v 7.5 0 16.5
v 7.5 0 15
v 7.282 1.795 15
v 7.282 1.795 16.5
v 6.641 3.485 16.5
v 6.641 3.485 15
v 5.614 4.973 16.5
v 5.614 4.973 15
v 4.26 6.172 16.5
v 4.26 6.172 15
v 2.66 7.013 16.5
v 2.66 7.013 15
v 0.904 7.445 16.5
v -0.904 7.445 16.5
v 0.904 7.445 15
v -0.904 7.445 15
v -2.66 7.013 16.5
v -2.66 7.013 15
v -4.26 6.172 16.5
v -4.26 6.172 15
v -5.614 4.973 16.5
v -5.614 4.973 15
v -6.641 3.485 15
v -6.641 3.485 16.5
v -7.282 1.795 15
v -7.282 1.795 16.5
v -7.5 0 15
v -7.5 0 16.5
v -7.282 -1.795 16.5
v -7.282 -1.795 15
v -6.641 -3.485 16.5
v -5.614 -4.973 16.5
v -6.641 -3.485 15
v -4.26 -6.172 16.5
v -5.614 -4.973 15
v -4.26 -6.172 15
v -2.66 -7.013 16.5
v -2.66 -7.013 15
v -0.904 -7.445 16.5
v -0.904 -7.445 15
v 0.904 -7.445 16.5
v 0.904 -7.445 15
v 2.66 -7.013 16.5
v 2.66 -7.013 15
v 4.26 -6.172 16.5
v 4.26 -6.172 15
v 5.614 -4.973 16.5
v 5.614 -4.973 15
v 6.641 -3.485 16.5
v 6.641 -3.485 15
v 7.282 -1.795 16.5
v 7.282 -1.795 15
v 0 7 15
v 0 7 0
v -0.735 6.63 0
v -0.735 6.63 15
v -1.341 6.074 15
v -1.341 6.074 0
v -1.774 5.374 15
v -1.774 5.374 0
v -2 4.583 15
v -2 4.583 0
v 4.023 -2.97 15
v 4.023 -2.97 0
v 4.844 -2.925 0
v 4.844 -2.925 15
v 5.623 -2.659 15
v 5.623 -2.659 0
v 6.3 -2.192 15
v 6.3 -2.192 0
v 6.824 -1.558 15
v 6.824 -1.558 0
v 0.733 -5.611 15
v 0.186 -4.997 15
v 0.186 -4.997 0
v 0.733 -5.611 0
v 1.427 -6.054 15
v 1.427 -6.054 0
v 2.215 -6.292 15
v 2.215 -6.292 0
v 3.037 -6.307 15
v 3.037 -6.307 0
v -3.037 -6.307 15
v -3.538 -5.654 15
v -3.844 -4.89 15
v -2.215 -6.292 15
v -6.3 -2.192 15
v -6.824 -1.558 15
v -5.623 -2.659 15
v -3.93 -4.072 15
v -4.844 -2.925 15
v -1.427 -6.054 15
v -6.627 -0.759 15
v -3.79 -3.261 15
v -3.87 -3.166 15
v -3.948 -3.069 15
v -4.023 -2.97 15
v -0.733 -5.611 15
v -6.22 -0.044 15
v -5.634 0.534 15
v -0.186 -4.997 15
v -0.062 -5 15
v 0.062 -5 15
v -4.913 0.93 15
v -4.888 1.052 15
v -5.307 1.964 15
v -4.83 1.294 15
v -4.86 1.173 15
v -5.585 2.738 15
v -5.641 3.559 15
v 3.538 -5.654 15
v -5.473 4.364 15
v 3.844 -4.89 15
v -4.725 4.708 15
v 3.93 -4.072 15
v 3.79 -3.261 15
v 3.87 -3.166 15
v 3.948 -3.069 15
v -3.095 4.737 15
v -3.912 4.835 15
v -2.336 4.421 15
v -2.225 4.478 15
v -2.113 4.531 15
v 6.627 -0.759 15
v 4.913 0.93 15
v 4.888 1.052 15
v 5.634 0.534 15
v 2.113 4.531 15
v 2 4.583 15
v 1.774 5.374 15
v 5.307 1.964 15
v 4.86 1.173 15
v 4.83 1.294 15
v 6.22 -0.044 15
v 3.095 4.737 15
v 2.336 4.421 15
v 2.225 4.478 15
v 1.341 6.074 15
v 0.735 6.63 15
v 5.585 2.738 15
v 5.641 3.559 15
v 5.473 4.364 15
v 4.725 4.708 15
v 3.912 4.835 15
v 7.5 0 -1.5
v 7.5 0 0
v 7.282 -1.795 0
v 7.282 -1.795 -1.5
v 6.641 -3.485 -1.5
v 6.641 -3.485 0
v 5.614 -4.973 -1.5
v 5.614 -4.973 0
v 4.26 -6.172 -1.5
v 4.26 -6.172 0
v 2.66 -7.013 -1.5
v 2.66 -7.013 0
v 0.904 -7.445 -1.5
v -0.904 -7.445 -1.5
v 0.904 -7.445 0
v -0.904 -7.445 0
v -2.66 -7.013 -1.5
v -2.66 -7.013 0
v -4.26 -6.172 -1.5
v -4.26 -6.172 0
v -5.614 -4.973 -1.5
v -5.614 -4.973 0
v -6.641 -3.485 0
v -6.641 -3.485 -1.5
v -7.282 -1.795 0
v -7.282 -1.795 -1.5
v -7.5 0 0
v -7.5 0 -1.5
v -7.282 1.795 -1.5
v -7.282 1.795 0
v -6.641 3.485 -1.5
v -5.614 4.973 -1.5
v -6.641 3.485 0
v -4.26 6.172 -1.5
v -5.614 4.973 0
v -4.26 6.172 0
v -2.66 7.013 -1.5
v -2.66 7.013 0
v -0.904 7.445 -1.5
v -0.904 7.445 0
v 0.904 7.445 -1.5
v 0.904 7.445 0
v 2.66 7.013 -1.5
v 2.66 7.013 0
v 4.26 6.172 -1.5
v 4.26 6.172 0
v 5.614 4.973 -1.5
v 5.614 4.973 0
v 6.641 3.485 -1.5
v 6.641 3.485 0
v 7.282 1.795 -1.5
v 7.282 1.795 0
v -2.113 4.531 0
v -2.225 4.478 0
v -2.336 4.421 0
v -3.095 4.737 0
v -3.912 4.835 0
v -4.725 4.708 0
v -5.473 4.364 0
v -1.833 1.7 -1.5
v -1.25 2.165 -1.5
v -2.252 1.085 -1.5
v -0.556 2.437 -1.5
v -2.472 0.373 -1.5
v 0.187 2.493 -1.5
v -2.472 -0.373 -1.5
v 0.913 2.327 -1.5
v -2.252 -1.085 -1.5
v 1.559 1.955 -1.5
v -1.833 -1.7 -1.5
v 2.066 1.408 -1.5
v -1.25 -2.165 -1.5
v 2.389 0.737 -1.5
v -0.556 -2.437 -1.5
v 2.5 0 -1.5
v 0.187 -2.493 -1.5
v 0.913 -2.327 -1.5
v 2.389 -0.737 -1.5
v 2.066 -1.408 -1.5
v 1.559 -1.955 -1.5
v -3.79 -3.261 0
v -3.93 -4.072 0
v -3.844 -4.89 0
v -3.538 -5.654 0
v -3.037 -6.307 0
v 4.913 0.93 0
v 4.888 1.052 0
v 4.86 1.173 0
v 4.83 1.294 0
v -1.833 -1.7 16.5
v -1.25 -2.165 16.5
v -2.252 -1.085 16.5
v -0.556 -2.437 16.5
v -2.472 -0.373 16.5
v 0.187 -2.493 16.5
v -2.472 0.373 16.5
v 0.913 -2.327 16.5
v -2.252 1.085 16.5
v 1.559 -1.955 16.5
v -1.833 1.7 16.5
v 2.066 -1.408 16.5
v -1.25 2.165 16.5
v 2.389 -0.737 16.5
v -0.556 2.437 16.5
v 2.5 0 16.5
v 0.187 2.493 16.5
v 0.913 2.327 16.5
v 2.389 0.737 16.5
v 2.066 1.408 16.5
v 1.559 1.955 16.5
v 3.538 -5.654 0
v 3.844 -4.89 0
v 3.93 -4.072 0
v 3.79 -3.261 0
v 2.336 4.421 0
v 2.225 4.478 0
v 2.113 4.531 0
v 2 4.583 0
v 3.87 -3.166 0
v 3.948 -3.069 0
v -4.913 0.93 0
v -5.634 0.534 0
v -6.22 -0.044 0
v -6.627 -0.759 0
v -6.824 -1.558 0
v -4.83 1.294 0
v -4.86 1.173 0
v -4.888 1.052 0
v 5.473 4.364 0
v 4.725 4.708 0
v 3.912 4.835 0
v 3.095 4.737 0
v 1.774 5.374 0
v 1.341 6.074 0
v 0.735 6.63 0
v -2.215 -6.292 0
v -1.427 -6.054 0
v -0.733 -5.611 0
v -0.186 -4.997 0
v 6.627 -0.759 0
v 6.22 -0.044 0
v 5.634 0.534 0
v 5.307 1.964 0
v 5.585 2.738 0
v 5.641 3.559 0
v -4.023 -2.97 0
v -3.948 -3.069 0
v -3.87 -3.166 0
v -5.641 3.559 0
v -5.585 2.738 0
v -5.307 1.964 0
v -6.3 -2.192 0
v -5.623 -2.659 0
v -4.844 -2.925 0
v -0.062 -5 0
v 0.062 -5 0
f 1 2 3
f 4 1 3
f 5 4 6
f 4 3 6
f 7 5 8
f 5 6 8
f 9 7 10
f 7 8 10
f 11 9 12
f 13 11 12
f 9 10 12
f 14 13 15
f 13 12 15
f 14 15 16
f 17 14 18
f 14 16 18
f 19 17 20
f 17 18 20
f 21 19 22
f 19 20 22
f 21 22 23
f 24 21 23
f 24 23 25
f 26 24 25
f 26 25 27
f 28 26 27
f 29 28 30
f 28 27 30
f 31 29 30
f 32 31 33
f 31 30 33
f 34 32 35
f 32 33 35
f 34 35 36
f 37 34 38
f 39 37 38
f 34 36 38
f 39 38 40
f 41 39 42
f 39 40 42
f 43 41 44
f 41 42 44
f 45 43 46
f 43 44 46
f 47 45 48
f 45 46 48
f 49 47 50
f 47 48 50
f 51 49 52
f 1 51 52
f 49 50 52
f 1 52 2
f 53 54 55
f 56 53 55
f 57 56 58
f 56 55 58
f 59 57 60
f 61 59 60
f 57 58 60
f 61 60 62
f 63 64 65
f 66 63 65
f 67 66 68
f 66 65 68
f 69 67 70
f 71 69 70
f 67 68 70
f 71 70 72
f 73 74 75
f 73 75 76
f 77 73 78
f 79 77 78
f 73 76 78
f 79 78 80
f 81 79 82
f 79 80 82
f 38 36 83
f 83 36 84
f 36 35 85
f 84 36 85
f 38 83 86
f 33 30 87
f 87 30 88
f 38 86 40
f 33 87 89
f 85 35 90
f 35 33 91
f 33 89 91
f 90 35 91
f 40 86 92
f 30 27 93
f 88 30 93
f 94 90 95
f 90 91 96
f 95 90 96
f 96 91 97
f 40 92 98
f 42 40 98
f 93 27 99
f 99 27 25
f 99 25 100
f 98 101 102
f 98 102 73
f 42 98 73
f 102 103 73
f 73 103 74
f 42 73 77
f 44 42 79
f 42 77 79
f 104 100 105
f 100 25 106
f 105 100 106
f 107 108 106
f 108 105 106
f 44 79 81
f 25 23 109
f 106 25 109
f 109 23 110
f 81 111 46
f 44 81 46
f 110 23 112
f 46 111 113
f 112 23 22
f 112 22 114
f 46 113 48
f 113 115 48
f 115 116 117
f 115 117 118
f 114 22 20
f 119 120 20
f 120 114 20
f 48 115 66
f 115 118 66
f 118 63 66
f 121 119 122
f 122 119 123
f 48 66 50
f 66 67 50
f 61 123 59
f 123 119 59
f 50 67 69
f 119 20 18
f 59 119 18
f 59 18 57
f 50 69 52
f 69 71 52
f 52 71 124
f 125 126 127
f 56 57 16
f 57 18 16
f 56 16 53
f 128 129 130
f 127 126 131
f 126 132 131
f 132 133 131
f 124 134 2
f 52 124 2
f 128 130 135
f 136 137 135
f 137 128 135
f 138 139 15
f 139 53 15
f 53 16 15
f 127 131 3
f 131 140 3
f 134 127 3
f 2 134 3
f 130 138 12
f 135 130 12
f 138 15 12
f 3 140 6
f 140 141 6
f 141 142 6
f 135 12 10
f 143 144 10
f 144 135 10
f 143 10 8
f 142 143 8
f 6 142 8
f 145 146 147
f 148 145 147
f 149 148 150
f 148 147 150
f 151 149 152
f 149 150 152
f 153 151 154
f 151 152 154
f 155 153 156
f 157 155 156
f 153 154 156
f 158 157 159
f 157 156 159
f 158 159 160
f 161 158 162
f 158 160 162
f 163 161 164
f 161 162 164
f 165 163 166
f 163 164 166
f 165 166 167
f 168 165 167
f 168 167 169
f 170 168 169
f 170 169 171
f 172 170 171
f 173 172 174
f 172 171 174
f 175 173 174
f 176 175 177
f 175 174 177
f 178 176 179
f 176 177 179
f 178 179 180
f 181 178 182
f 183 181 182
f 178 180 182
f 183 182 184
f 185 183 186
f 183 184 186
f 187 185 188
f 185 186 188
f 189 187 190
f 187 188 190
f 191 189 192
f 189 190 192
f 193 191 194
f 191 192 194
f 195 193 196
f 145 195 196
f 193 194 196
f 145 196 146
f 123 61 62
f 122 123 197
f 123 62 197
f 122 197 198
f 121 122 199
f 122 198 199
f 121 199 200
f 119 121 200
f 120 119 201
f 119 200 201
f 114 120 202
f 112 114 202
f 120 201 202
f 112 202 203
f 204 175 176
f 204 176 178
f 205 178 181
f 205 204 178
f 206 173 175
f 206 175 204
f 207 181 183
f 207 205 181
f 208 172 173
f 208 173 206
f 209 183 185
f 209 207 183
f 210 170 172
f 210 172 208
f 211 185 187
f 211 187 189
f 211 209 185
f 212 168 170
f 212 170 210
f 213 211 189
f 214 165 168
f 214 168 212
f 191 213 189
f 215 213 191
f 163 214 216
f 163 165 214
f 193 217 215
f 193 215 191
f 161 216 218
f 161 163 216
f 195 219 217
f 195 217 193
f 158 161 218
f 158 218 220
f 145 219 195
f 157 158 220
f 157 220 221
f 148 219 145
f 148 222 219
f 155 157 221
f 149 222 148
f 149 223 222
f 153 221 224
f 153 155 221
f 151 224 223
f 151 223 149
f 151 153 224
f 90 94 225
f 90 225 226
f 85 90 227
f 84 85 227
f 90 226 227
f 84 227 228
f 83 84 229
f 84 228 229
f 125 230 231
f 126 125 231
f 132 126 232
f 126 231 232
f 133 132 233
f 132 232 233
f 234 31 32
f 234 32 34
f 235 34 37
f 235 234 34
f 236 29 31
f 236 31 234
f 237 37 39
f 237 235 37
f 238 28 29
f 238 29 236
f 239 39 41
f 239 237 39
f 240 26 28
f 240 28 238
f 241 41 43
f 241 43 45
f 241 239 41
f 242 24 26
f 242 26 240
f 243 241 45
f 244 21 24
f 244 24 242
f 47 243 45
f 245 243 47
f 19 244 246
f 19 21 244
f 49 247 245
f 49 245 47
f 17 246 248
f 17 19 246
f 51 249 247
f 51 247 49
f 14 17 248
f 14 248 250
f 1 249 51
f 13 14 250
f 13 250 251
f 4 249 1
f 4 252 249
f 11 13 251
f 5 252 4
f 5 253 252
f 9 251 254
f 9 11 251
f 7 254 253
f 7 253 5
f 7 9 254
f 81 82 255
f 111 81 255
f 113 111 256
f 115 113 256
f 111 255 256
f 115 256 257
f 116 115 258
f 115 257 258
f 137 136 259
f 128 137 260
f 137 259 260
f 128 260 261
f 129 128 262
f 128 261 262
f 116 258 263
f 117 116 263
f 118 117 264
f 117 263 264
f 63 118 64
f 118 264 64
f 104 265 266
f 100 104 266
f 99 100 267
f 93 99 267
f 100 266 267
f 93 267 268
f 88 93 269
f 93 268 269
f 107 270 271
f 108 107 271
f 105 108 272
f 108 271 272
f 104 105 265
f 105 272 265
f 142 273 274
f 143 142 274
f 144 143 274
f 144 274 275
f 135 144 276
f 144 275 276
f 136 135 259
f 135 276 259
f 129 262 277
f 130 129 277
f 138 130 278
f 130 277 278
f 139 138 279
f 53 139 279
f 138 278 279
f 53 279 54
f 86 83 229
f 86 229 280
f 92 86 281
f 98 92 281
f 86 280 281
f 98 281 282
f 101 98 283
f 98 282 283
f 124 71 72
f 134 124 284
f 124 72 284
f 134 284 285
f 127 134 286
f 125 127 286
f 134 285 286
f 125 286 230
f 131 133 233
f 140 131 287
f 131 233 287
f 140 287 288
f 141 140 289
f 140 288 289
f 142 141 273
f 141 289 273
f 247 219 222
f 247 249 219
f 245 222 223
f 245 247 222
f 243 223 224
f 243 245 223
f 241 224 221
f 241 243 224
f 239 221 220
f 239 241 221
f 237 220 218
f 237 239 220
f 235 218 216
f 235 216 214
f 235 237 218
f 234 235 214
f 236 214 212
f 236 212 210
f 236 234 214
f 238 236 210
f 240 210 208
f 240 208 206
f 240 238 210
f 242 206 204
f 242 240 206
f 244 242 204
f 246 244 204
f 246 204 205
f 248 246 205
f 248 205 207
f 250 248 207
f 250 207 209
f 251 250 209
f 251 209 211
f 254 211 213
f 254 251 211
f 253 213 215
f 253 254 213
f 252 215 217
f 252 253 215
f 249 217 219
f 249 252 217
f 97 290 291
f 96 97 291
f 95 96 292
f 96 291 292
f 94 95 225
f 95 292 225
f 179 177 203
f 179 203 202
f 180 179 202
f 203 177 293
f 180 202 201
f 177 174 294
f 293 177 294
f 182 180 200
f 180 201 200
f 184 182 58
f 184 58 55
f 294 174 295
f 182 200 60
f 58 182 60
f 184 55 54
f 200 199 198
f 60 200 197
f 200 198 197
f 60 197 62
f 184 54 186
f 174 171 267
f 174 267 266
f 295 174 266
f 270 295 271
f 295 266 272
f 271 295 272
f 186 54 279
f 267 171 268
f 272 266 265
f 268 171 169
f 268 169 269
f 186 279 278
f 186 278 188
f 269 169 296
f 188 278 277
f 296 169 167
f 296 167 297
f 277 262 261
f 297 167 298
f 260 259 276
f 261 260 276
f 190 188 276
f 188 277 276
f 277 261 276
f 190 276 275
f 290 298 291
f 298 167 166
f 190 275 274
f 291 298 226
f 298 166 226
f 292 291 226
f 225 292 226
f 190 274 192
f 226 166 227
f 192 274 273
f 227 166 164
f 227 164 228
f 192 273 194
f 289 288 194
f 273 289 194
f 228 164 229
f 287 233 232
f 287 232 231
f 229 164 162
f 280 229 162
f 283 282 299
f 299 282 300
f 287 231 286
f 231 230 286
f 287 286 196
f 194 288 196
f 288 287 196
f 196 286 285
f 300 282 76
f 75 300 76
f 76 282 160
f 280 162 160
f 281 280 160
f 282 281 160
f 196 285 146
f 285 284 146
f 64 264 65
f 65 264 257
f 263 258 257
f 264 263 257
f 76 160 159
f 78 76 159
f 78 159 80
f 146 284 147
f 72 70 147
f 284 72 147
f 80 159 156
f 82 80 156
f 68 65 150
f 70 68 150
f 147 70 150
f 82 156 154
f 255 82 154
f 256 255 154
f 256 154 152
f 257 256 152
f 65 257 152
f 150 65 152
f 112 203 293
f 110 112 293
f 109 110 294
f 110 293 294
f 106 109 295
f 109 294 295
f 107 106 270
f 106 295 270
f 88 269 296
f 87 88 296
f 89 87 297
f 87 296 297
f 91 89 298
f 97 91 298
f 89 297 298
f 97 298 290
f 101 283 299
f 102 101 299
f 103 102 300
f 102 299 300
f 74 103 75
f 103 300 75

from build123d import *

# Parameters (mm, degrees)
F0_R     = 2.5
F1_DEPTH = 15
F2_R     = 7.5
F2_R_2   = 2.5
F3_DEPTH = 1.5
F4_R     = 7.5
F4_R_2   = 2.5
F5_DEPTH = 1.5


with BuildPart() as f1:
    # F0 (on Top) → F1 (new body)
    with BuildSketch(Plane.XY):
        with BuildLine():
            ThreePointArc((0, 7), (-1.3412127701, 6.0735823287), (-2, 4.582575695))
            ThreePointArc((-2, 4.582575695), (-2.1694186956, 4.5048443395), (-2.3358223454, 4.420852177))
            ThreePointArc((-2.3358223454, 4.420852177), (-3.9122853917, 4.8354190111), (-5.4728203773, 4.364428613))
            ThreePointArc((-5.4728203773, 4.364428613), (-5.5847503602, 2.7382142744), (-4.8297815528, 1.2935262471))
            ThreePointArc((-4.8297815528, 1.2935262471), (-4.8746395609, 1.1126046698), (-4.9127228226, 0.9301368008))
            ThreePointArc((-4.9127228226, 0.9301368008), (-6.2197528574, -0.0439134465), (-6.8244953853, -1.5576465377))
            ThreePointArc((-6.8244953853, -1.5576465377), (-5.622857021, -2.659084978), (-4.0226390868, -2.9695748479))
            ThreePointArc((-4.0226390868, -2.9695748479), (-3.9091574123, -3.1174490093), (-3.7902428131, -3.2609905577))
            ThreePointArc((-3.7902428131, -3.2609905577), (-3.8436195617, -4.8901781832), (-3.0371861738, -6.3067820753))
            ThreePointArc((-3.0371861738, -6.3067820753), (-1.4268376596, -6.0540390065), (-0.1863673415, -4.9965255142))
            ThreePointArc((-0.1863673415, -4.9965255142), (0, -5), (0.1863673415, -4.9965255142))
            ThreePointArc((0.1863673415, -4.9965255142), (1.4268376596, -6.0540390065), (3.0371861738, -6.3067820753))
            ThreePointArc((3.0371861738, -6.3067820753), (3.8436195617, -4.8901781832), (3.7902428131, -3.2609905577))
            ThreePointArc((3.7902428131, -3.2609905577), (3.9091574123, -3.1174490093), (4.0226390868, -2.9695748479))
            ThreePointArc((4.0226390868, -2.9695748479), (5.622857021, -2.659084978), (6.8244953853, -1.5576465377))
            ThreePointArc((6.8244953853, -1.5576465377), (6.2197528574, -0.0439134465), (4.9127228226, 0.9301368008))
            ThreePointArc((4.9127228226, 0.9301368008), (4.8746395609, 1.1126046698), (4.8297815528, 1.2935262471))
            ThreePointArc((4.8297815528, 1.2935262471), (5.5847503602, 2.7382142744), (5.4728203773, 4.364428613))
            ThreePointArc((5.4728203773, 4.364428613), (3.9122853917, 4.8354190111), (2.3358223454, 4.420852177))
            ThreePointArc((2.3358223454, 4.420852177), (2.1694186956, 4.5048443395), (2, 4.582575695))
            ThreePointArc((2, 4.582575695), (1.3412127701, 6.0735823287), (0, 7))
        make_face()
        Circle(F0_R, mode=Mode.SUBTRACT)
    extrude(amount=F1_DEPTH)

    # F2 (on face) → F3 (join)
    with BuildSketch(Plane.XY.offset(15)):
        Circle(F2_R)
        with BuildLine():
            ThreePointArc((4.8297815528, 1.2935262471), (4.8746395609, 1.1126046698), (4.9127228226, 0.9301368008))
            ThreePointArc((4.9127228226, 0.9301368008), (6.2197528574, -0.0439134465), (6.8244953853, -1.5576465377))
            ThreePointArc((6.8244953853, -1.5576465377), (5.622857021, -2.659084978), (4.0226390868, -2.9695748479))
            ThreePointArc((4.0226390868, -2.9695748479), (3.9091574123, -3.1174490093), (3.7902428131, -3.2609905577))
            ThreePointArc((3.7902428131, -3.2609905577), (3.8436195617, -4.8901781832), (3.0371861738, -6.3067820753))
            ThreePointArc((3.0371861738, -6.3067820753), (1.4268376596, -6.0540390065), (0.1863673415, -4.9965255142))
            ThreePointArc((0.1863673415, -4.9965255142), (0, -5), (-0.1863673415, -4.9965255142))
            ThreePointArc((-0.1863673415, -4.9965255142), (-1.4268376596, -6.0540390065), (-3.0371861738, -6.3067820753))
            ThreePointArc((-3.0371861738, -6.3067820753), (-3.8436195617, -4.8901781832), (-3.7902428131, -3.2609905577))
            ThreePointArc((-3.7902428131, -3.2609905577), (-3.9091574123, -3.1174490093), (-4.0226390868, -2.9695748479))
            ThreePointArc((-4.0226390868, -2.9695748479), (-5.622857021, -2.659084978), (-6.8244953853, -1.5576465377))
            ThreePointArc((-6.8244953853, -1.5576465377), (-6.2197528574, -0.0439134465), (-4.9127228226, 0.9301368008))
            ThreePointArc((-4.9127228226, 0.9301368008), (-4.8746395609, 1.1126046698), (-4.8297815528, 1.2935262471))
            ThreePointArc((-4.8297815528, 1.2935262471), (-5.5847503602, 2.7382142744), (-5.4728203773, 4.364428613))
            ThreePointArc((-5.4728203773, 4.364428613), (-3.9122853917, 4.8354190111), (-2.3358223454, 4.420852177))
            ThreePointArc((-2.3358223454, 4.420852177), (-2.1694186956, 4.5048443395), (-2, 4.582575695))
            ThreePointArc((-2, 4.582575695), (-1.3412127701, 6.0735823287), (0, 7))
            ThreePointArc((0, 7), (1.3412127701, 6.0735823287), (2, 4.582575695))
            ThreePointArc((2, 4.582575695), (2.1694186956, 4.5048443395), (2.3358223454, 4.420852177))
            ThreePointArc((2.3358223454, 4.420852177), (3.9122853917, 4.8354190111), (5.4728203773, 4.364428613))
            ThreePointArc((5.4728203773, 4.364428613), (5.5847503602, 2.7382142744), (4.8297815528, 1.2935262471))
        make_face(mode=Mode.SUBTRACT)
        with BuildLine():
            ThreePointArc((6.8244953853, -1.5576465377), (6.2197528574, -0.0439134465), (4.9127228226, 0.9301368008))
            ThreePointArc((4.9127228226, 0.9301368008), (4.8746395609, 1.1126046698), (4.8297815528, 1.2935262471))
            ThreePointArc((4.8297815528, 1.2935262471), (5.5847503602, 2.7382142744), (5.4728203773, 4.364428613))
            ThreePointArc((5.4728203773, 4.364428613), (3.9122853917, 4.8354190111), (2.3358223454, 4.420852177))
            ThreePointArc((2.3358223454, 4.420852177), (2.1694186956, 4.5048443395), (2, 4.582575695))
            ThreePointArc((2, 4.582575695), (1.3412127701, 6.0735823287), (0, 7))
            ThreePointArc((0, 7), (-1.3412127701, 6.0735823287), (-2, 4.582575695))
            ThreePointArc((-2, 4.582575695), (-2.1694186956, 4.5048443395), (-2.3358223454, 4.420852177))
            ThreePointArc((-2.3358223454, 4.420852177), (-3.9122853917, 4.8354190111), (-5.4728203773, 4.364428613))
            ThreePointArc((-5.4728203773, 4.364428613), (-5.5847503602, 2.7382142744), (-4.8297815528, 1.2935262471))
            ThreePointArc((-4.8297815528, 1.2935262471), (-4.8746395609, 1.1126046698), (-4.9127228226, 0.9301368008))
            ThreePointArc((-4.9127228226, 0.9301368008), (-6.2197528574, -0.0439134465), (-6.8244953853, -1.5576465377))
            ThreePointArc((-6.8244953853, -1.5576465377), (-5.622857021, -2.659084978), (-4.0226390868, -2.9695748479))
            ThreePointArc((-4.0226390868, -2.9695748479), (-3.9091574123, -3.1174490093), (-3.7902428131, -3.2609905577))
            ThreePointArc((-3.7902428131, -3.2609905577), (-3.8436195617, -4.8901781832), (-3.0371861738, -6.3067820753))
            ThreePointArc((-3.0371861738, -6.3067820753), (-1.4268376596, -6.0540390065), (-0.1863673415, -4.9965255142))
            ThreePointArc((-0.1863673415, -4.9965255142), (0, -5), (0.1863673415, -4.9965255142))
            ThreePointArc((0.1863673415, -4.9965255142), (1.4268376596, -6.0540390065), (3.0371861738, -6.3067820753))
            ThreePointArc((3.0371861738, -6.3067820753), (3.8436195617, -4.8901781832), (3.7902428131, -3.2609905577))
            ThreePointArc((3.7902428131, -3.2609905577), (3.9091574123, -3.1174490093), (4.0226390868, -2.9695748479))
            ThreePointArc((4.0226390868, -2.9695748479), (5.622857021, -2.659084978), (6.8244953853, -1.5576465377))
        make_face()
        Circle(F2_R_2, mode=Mode.SUBTRACT)
    extrude(amount=F3_DEPTH)

    # F4 (on face) → F5 (join)
    with BuildSketch(Plane(origin=(0, 0, 0), x_dir=(1, 0, 0), z_dir=(0, 0, -1))):
        Circle(F4_R)
        with BuildLine():
            ThreePointArc((4.9127228226, -0.9301368008), (4.8746395609, -1.1126046698), (4.8297815528, -1.2935262471))
            ThreePointArc((4.8297815528, -1.2935262471), (5.5847503602, -2.7382142744), (5.4728203773, -4.364428613))
            ThreePointArc((5.4728203773, -4.364428613), (3.9122853917, -4.8354190111), (2.3358223454, -4.420852177))
            ThreePointArc((2.3358223454, -4.420852177), (2.1694186956, -4.5048443395), (2, -4.582575695))
            ThreePointArc((2, -4.582575695), (1.3412127701, -6.0735823287), (0, -7))
            ThreePointArc((0, -7), (-1.3412127701, -6.0735823287), (-2, -4.582575695))
            ThreePointArc((-2, -4.582575695), (-2.1694186956, -4.5048443395), (-2.3358223454, -4.420852177))
            ThreePointArc((-2.3358223454, -4.420852177), (-3.9122853917, -4.8354190111), (-5.4728203773, -4.364428613))
            ThreePointArc((-5.4728203773, -4.364428613), (-5.5847503602, -2.7382142744), (-4.8297815528, -1.2935262471))
            ThreePointArc((-4.8297815528, -1.2935262471), (-4.8746395609, -1.1126046698), (-4.9127228226, -0.9301368008))
            ThreePointArc((-4.9127228226, -0.9301368008), (-6.2197528574, 0.0439134465), (-6.8244953853, 1.5576465377))
            ThreePointArc((-6.8244953853, 1.5576465377), (-5.622857021, 2.659084978), (-4.0226390868, 2.9695748479))
            ThreePointArc((-4.0226390868, 2.9695748479), (-3.9091574123, 3.1174490093), (-3.7902428131, 3.2609905577))
            ThreePointArc((-3.7902428131, 3.2609905577), (-3.8436195617, 4.8901781832), (-3.0371861738, 6.3067820753))
            ThreePointArc((-3.0371861738, 6.3067820753), (-1.4268376596, 6.0540390065), (-0.1863673415, 4.9965255142))
            ThreePointArc((-0.1863673415, 4.9965255142), (0, 5), (0.1863673415, 4.9965255142))
            ThreePointArc((0.1863673415, 4.9965255142), (1.4268376596, 6.0540390065), (3.0371861738, 6.3067820753))
            ThreePointArc((3.0371861738, 6.3067820753), (3.8436195617, 4.8901781832), (3.7902428131, 3.2609905577))
            ThreePointArc((3.7902428131, 3.2609905577), (3.9091574123, 3.1174490093), (4.0226390868, 2.9695748479))
            ThreePointArc((4.0226390868, 2.9695748479), (5.622857021, 2.659084978), (6.8244953853, 1.5576465377))
            ThreePointArc((6.8244953853, 1.5576465377), (6.2197528574, 0.0439134465), (4.9127228226, -0.9301368008))
        make_face(mode=Mode.SUBTRACT)
        with BuildLine():
            ThreePointArc((5.4728203773, -4.364428613), (5.5847503602, -2.7382142744), (4.8297815528, -1.2935262471))
            ThreePointArc((4.8297815528, -1.2935262471), (4.8746395609, -1.1126046698), (4.9127228226, -0.9301368008))
            ThreePointArc((4.9127228226, -0.9301368008), (6.2197528574, 0.0439134465), (6.8244953853, 1.5576465377))
            ThreePointArc((6.8244953853, 1.5576465377), (5.622857021, 2.659084978), (4.0226390868, 2.9695748479))
            ThreePointArc((4.0226390868, 2.9695748479), (3.9091574123, 3.1174490093), (3.7902428131, 3.2609905577))
            ThreePointArc((3.7902428131, 3.2609905577), (3.8436195617, 4.8901781832), (3.0371861738, 6.3067820753))
            ThreePointArc((3.0371861738, 6.3067820753), (1.4268376596, 6.0540390065), (0.1863673415, 4.9965255142))
            ThreePointArc((0.1863673415, 4.9965255142), (0, 5), (-0.1863673415, 4.9965255142))
            ThreePointArc((-0.1863673415, 4.9965255142), (-1.4268376596, 6.0540390065), (-3.0371861738, 6.3067820753))
            ThreePointArc((-3.0371861738, 6.3067820753), (-3.8436195617, 4.8901781832), (-3.7902428131, 3.2609905577))
            ThreePointArc((-3.7902428131, 3.2609905577), (-3.9091574123, 3.1174490093), (-4.0226390868, 2.9695748479))
            ThreePointArc((-4.0226390868, 2.9695748479), (-5.622857021, 2.659084978), (-6.8244953853, 1.5576465377))
            ThreePointArc((-6.8244953853, 1.5576465377), (-6.2197528574, 0.0439134465), (-4.9127228226, -0.9301368008))
            ThreePointArc((-4.9127228226, -0.9301368008), (-4.8746395609, -1.1126046698), (-4.8297815528, -1.2935262471))
            ThreePointArc((-4.8297815528, -1.2935262471), (-5.5847503602, -2.7382142744), (-5.4728203773, -4.364428613))
            ThreePointArc((-5.4728203773, -4.364428613), (-3.9122853917, -4.8354190111), (-2.3358223454, -4.420852177))
            ThreePointArc((-2.3358223454, -4.420852177), (-2.1694186956, -4.5048443395), (-2, -4.582575695))
            ThreePointArc((-2, -4.582575695), (-1.3412127701, -6.0735823287), (0, -7))
            ThreePointArc((0, -7), (1.3412127701, -6.0735823287), (2, -4.582575695))
            ThreePointArc((2, -4.582575695), (2.1694186956, -4.5048443395), (2.3358223454, -4.420852177))
            ThreePointArc((2.3358223454, -4.420852177), (3.9122853917, -4.8354190111), (5.4728203773, -4.364428613))
        make_face()
        Circle(F4_R_2, mode=Mode.SUBTRACT)
    extrude(amount=F5_DEPTH)


solid = f1.part
